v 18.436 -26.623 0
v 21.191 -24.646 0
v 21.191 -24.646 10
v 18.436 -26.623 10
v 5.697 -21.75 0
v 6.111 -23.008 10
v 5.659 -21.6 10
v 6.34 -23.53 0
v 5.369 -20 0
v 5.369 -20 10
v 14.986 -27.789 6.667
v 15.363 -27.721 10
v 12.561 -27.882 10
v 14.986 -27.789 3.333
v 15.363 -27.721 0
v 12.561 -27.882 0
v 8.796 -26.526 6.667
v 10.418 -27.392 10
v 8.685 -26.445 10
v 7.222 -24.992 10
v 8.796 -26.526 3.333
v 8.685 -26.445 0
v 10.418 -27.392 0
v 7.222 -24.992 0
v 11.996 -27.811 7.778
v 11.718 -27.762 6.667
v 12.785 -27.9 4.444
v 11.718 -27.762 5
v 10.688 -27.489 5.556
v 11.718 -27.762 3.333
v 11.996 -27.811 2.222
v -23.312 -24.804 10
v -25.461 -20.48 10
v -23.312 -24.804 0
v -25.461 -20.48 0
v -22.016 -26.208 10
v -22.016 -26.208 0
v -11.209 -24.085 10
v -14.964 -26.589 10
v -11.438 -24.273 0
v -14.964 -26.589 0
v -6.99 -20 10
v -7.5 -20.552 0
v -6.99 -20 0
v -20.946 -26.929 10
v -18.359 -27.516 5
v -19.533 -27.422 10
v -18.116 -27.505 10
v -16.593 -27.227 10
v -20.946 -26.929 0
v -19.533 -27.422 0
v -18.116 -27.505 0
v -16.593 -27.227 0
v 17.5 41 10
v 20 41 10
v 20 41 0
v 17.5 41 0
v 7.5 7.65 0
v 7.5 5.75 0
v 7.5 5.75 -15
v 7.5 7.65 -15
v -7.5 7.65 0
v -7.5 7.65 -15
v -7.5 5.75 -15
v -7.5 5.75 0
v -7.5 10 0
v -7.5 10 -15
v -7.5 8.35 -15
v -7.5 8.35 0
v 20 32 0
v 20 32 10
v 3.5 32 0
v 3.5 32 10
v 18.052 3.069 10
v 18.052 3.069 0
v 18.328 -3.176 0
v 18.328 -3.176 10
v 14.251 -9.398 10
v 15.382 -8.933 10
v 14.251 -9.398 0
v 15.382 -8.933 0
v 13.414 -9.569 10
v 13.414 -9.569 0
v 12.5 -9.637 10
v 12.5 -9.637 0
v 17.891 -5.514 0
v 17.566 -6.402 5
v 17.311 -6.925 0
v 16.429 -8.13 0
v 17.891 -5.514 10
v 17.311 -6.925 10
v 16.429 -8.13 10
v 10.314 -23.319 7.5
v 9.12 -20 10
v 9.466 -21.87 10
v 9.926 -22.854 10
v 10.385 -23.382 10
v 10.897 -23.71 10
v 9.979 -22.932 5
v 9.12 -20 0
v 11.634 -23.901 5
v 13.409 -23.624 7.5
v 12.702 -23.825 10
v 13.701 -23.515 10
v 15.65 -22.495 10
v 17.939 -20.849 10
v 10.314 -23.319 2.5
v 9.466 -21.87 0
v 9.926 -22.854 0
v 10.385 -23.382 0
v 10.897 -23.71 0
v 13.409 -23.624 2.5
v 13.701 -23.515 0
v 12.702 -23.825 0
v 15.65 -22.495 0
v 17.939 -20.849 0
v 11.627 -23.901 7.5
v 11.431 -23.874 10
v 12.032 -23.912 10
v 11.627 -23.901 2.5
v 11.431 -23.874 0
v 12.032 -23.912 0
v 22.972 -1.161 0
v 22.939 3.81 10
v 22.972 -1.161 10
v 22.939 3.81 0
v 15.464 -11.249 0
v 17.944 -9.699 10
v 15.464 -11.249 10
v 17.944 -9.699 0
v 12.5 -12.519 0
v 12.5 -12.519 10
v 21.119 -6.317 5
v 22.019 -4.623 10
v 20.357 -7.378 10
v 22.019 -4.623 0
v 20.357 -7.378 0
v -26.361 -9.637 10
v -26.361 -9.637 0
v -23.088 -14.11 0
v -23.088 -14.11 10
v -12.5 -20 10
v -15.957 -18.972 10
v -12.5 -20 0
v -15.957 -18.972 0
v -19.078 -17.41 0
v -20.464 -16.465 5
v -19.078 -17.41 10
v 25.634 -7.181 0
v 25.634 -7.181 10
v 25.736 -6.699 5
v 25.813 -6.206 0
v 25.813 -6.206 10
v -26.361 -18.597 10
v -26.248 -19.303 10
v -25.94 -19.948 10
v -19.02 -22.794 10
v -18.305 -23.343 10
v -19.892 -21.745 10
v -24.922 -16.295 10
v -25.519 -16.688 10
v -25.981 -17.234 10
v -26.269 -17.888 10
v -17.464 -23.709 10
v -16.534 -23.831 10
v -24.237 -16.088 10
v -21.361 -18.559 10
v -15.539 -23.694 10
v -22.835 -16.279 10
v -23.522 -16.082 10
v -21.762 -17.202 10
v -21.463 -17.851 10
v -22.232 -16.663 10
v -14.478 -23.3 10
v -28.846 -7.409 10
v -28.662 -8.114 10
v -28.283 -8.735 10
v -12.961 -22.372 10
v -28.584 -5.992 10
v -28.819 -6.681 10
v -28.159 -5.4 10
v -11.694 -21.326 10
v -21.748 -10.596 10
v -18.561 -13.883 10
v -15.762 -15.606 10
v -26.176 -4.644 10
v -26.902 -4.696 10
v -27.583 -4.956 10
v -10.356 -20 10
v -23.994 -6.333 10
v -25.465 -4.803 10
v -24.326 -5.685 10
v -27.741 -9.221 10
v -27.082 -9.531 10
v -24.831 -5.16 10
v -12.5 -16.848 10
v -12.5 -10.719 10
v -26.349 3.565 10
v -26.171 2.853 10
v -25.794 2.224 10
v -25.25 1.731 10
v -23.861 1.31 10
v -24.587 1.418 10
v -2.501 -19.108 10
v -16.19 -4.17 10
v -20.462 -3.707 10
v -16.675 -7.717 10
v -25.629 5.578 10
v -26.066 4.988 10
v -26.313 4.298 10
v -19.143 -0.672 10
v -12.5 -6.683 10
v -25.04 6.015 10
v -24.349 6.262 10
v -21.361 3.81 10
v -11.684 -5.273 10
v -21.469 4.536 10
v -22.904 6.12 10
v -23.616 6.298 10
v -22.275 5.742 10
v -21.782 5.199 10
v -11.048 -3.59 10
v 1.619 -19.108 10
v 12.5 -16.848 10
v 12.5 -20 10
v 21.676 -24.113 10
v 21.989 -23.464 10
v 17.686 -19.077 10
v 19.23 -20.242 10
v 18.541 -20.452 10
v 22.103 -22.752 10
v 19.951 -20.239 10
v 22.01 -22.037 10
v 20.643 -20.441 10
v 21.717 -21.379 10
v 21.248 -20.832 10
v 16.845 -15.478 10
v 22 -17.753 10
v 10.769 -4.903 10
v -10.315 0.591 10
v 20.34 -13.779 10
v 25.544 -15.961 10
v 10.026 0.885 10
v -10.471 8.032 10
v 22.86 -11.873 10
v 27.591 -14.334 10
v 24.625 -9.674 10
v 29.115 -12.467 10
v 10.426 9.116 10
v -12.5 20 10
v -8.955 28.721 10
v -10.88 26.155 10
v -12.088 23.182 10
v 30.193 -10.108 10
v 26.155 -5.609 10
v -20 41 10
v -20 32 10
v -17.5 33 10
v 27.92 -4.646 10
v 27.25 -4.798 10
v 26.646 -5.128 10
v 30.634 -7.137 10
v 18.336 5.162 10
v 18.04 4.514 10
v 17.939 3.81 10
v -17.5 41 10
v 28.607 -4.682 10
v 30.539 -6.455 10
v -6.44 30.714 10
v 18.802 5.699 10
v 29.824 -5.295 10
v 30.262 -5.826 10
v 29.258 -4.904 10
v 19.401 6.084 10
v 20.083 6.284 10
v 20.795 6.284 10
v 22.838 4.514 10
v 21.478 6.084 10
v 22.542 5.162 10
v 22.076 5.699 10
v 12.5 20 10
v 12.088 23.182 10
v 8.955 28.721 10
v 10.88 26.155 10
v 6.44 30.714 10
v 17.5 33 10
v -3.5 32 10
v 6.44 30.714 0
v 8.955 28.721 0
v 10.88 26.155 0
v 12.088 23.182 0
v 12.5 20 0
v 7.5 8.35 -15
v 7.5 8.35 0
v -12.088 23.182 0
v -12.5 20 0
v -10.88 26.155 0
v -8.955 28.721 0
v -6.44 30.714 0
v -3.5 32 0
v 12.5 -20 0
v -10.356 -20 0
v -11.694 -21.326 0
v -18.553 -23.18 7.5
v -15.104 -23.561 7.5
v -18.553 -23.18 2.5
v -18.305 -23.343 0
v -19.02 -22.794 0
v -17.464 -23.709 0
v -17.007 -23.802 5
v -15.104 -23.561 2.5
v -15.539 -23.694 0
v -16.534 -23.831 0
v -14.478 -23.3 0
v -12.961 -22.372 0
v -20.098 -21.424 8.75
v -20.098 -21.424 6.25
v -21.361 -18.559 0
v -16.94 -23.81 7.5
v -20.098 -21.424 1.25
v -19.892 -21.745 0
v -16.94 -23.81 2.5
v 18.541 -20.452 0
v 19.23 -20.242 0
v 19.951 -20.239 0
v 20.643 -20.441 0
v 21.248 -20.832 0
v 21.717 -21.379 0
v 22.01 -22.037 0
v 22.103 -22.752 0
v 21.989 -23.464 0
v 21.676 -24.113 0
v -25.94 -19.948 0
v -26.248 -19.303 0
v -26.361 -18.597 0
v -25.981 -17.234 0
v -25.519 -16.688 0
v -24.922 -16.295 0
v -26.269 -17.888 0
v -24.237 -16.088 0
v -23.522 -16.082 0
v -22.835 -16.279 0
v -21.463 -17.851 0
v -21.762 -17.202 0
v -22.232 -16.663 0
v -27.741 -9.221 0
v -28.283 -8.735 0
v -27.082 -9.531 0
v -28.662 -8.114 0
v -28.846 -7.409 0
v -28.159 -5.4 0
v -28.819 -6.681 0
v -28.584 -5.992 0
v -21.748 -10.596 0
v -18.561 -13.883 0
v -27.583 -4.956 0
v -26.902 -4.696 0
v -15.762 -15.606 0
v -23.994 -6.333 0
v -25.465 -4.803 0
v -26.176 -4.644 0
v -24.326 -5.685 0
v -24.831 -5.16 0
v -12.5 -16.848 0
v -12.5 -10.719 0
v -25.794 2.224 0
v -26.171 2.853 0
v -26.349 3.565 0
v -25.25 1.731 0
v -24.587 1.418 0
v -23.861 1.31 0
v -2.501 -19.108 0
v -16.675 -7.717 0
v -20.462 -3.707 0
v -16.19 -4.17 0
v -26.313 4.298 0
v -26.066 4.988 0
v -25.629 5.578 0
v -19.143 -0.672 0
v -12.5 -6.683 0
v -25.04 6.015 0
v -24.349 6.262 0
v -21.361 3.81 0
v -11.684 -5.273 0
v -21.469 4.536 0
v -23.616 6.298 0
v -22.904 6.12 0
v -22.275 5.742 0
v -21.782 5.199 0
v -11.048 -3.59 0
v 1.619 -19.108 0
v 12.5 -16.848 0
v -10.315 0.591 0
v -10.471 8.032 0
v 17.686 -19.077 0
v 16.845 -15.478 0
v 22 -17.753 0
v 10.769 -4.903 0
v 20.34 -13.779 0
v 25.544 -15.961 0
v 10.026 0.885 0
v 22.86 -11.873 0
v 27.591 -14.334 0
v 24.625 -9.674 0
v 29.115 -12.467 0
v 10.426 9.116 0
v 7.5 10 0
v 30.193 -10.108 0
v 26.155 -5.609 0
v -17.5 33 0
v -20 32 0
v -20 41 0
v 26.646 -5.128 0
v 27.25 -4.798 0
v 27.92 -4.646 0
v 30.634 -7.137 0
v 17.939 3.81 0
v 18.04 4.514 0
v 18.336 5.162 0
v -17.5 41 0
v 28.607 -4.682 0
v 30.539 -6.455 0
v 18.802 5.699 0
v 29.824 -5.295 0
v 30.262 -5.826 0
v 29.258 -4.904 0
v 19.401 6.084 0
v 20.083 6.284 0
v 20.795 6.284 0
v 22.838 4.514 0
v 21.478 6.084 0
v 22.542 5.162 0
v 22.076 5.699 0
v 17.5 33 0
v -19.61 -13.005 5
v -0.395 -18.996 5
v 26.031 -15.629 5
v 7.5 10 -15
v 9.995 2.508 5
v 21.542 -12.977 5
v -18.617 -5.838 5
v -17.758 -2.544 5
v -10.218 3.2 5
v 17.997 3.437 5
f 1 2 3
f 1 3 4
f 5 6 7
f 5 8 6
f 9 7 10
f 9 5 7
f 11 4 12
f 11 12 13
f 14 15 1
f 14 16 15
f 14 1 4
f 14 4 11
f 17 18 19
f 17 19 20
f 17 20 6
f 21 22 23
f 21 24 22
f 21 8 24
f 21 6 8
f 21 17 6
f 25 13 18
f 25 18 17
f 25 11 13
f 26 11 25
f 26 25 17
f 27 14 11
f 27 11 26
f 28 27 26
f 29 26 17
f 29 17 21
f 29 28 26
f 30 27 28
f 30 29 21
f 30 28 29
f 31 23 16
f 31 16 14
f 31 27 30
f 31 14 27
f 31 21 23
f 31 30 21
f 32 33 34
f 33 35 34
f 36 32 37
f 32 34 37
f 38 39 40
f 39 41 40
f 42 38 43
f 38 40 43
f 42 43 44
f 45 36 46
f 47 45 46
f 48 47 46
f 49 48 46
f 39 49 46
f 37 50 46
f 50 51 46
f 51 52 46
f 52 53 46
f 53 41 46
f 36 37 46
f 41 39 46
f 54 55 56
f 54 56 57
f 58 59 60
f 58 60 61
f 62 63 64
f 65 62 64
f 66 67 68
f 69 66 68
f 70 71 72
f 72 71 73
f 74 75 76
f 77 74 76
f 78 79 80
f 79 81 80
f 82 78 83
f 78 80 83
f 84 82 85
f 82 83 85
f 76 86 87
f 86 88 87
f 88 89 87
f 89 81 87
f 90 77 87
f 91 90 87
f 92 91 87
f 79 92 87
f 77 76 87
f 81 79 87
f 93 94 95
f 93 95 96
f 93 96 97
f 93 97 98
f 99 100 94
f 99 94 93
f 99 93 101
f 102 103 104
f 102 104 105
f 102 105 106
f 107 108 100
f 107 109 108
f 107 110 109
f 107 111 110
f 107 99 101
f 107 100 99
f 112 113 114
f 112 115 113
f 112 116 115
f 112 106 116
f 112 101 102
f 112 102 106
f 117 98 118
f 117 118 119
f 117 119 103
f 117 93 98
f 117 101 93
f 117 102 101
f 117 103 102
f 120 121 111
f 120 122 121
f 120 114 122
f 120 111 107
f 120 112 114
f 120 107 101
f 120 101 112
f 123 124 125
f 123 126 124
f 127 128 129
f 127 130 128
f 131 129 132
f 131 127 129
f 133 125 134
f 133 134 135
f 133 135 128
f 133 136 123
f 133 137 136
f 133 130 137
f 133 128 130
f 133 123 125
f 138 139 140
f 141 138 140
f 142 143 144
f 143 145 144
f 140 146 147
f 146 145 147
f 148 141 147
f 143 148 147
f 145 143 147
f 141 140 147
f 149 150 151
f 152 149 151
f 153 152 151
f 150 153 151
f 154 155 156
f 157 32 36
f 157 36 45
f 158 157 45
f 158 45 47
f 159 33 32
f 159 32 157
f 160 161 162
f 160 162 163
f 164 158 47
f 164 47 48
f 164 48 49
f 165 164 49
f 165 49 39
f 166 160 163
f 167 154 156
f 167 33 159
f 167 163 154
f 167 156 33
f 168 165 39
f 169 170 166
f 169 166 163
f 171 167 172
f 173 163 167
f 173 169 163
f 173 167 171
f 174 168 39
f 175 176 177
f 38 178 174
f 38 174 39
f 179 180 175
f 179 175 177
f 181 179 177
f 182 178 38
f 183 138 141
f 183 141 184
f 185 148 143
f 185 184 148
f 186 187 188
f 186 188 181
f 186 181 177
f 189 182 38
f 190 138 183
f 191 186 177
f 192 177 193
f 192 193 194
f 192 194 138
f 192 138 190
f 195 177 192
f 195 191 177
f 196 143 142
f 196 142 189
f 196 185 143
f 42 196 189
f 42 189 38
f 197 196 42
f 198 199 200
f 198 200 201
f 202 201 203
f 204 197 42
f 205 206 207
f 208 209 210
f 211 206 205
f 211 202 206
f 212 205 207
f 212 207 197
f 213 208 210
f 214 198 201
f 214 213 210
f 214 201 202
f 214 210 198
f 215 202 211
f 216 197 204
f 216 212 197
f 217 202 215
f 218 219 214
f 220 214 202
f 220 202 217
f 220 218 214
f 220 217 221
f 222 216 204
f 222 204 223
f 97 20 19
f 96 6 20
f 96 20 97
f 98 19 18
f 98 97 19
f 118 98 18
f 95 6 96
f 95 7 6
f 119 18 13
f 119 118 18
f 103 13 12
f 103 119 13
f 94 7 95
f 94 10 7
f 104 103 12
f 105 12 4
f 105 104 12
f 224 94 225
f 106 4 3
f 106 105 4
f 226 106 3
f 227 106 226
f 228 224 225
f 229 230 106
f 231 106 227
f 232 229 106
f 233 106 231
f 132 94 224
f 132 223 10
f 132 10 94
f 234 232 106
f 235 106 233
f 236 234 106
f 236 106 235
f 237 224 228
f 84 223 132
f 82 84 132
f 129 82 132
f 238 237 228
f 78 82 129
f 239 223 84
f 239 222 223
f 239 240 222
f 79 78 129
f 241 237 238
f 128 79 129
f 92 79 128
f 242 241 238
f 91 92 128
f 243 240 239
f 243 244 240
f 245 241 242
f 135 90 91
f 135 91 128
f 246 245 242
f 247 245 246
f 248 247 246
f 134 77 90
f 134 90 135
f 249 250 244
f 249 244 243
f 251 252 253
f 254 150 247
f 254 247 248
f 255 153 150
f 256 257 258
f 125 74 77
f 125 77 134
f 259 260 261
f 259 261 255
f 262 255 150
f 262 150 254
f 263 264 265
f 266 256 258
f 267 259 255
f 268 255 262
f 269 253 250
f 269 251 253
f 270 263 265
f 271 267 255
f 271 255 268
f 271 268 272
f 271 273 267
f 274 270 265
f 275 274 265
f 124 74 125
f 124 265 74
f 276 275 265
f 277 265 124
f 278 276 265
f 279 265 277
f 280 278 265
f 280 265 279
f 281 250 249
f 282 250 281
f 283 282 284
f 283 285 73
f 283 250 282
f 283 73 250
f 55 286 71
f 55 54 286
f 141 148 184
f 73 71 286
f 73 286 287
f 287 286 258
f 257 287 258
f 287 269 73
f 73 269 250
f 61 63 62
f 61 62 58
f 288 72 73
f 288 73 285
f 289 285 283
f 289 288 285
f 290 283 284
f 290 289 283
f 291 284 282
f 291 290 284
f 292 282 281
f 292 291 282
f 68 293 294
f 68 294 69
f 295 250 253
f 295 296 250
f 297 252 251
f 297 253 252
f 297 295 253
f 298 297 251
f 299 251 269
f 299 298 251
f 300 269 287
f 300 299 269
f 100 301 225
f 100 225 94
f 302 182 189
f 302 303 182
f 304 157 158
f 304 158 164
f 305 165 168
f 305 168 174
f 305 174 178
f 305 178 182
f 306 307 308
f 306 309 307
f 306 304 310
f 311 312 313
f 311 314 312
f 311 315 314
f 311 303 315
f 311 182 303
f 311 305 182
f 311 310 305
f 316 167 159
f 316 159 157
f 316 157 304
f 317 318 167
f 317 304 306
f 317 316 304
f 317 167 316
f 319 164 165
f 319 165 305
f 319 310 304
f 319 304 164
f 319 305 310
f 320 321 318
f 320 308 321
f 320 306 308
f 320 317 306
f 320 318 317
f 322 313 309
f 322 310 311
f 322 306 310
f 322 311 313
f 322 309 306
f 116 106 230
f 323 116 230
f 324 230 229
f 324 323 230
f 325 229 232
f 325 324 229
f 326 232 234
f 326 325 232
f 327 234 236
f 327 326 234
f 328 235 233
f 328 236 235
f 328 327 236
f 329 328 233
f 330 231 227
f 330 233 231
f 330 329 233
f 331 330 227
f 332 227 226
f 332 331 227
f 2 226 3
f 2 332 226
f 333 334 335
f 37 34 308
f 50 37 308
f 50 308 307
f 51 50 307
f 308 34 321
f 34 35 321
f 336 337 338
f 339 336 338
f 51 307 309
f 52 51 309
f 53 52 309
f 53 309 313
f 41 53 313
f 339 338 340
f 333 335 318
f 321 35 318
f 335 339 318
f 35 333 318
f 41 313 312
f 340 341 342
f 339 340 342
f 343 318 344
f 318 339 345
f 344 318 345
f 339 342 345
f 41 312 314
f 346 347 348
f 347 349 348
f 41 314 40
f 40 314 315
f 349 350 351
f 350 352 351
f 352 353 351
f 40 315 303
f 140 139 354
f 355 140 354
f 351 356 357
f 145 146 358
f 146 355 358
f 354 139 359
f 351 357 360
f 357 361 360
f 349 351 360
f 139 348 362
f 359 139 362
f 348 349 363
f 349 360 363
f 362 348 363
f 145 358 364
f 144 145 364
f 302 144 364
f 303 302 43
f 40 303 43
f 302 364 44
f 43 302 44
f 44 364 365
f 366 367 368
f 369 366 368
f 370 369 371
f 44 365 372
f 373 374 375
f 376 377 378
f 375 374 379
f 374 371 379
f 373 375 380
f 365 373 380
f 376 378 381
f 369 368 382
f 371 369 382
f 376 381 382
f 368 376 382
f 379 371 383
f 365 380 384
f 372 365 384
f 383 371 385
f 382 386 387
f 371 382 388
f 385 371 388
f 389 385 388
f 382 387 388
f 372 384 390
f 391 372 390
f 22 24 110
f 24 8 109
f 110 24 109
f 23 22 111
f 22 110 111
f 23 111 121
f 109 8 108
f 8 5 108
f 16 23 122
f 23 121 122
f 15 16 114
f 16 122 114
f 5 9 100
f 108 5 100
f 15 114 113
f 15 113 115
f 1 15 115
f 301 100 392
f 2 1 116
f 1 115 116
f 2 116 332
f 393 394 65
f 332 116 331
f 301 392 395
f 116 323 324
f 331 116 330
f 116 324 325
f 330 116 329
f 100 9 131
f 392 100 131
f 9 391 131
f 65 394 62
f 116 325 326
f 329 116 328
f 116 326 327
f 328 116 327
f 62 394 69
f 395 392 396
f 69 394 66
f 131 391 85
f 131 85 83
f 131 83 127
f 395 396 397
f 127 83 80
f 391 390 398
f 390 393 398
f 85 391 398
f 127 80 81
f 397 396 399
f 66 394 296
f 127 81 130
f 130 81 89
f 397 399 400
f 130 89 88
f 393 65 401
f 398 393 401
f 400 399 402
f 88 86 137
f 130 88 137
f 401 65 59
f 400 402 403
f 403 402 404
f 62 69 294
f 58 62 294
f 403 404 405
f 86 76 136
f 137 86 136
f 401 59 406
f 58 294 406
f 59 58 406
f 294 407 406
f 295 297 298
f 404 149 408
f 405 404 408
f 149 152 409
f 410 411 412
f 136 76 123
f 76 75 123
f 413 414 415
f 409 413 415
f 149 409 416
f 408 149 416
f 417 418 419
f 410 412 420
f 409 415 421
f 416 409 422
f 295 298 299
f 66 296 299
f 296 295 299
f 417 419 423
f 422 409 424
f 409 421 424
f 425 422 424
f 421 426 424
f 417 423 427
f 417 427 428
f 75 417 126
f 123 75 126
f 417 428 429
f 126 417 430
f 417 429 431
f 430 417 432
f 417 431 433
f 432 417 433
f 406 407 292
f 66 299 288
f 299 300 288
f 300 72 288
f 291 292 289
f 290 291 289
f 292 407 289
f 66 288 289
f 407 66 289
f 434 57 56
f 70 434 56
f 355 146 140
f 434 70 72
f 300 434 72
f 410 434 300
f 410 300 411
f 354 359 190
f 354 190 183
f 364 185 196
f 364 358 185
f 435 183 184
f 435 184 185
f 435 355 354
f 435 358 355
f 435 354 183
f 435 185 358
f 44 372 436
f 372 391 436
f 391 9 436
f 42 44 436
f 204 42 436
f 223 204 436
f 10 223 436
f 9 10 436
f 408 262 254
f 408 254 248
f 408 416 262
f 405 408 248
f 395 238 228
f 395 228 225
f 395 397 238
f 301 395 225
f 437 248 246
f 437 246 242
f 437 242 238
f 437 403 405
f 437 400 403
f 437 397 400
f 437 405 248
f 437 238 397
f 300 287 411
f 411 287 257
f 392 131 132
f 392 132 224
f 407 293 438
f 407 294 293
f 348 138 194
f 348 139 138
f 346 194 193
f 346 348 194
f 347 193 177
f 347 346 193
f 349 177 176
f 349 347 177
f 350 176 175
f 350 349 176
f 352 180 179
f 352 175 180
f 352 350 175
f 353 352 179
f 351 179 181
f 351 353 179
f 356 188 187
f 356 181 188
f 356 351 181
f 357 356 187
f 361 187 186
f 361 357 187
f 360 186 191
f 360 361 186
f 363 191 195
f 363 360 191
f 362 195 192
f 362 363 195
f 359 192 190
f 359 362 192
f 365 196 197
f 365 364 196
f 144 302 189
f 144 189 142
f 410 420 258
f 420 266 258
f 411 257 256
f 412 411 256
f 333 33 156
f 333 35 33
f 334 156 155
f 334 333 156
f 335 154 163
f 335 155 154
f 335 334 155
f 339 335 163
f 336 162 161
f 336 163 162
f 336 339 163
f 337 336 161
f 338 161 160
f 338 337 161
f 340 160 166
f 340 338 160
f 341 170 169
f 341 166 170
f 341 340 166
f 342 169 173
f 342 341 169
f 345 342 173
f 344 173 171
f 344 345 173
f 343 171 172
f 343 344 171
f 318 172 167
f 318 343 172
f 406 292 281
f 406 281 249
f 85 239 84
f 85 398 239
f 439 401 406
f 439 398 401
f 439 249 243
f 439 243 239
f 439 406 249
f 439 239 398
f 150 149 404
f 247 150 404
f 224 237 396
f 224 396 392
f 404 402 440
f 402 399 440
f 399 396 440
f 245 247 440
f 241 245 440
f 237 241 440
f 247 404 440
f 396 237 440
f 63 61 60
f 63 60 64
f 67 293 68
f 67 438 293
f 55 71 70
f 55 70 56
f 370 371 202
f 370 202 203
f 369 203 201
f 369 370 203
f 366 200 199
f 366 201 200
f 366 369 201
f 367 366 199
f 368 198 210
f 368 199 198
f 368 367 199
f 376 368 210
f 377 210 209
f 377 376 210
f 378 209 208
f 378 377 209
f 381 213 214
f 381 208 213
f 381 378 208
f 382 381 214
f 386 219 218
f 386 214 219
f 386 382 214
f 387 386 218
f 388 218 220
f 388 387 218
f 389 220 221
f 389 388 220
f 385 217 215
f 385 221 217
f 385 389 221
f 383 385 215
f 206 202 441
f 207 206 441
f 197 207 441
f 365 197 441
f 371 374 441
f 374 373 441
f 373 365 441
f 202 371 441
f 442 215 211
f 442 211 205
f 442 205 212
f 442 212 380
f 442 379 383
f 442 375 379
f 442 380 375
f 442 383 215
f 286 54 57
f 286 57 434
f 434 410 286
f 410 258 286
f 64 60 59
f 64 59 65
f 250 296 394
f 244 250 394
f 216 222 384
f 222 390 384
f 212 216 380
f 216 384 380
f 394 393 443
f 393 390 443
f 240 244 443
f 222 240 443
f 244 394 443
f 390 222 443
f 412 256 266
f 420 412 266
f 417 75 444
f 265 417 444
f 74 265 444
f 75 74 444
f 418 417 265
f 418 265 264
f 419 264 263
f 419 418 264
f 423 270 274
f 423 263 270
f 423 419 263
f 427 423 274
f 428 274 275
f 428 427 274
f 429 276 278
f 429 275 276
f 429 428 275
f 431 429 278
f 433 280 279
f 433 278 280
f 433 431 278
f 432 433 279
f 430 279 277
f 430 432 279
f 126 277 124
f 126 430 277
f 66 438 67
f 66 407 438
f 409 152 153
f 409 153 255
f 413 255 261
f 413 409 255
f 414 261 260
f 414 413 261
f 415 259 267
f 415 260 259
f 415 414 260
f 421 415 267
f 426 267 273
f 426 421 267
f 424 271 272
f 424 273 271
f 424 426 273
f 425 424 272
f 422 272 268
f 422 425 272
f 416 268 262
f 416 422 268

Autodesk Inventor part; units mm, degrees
ref_plane "YZ Plane" through (0, 0, 0) normal (1, 0, 0) x (0, 1, 0)
ref_plane "XZ Plane" through (0, 0, 0) normal (0, 1, 0) x (-1, 0, 0)
ref_plane "XY Plane" through (0, 0, 0) normal (0, 0, 1) x (1, 0, 0)
sketch "Sketch2" plane through (0, 0, 0) normal (0, 0, 1) x (1, 0, 0)
  line L0 (-12.5, -16.8475) -> (-12.5, -10.7194)
  line L1 (12.5, -12.5194) -> (12.5, -16.8475)
  line L2 (12.5, -20) -> (-12.5, 20) construction
  line L3 (-12.5, -20) -> (12.5, 20) construction
  arc A0 (12.5, 20) -> (-12.5, 20) centre (0, 20) ccw
  arc A1 (-23.9938, -6.3332) -> (-26.3611, -9.6367) centre (-26.3611, -7.1367) ccw
  arc A2 (-21.3611, 3.8099) -> (-23.8611, 1.3099) centre (-23.8611, 3.8099) ccw
  arc A3 (-21.3611, -18.5591) -> (-25.4614, -20.4798) centre (-23.8611, -18.5591) ccw
  arc A4 (22.9392, 3.8099) -> (18.0516, 3.0686) centre (20.4392, 3.8099) ccw
  arc A5 (30.6335, -7.1367) -> (25.6339, -7.1814) centre (28.1335, -7.1367) ccw
  arc A6 (21.1908, -24.646) -> (17.9392, -20.8491) centre (19.6037, -22.7144) ccw
  spline S0 degree 2 poles (-23.8611, 1.3099) (-19.0526, -6.9708) (-12.5, -10.7194) knots 0 0 0 1 1 1
  spline S1 degree 2 poles (-21.3611, 3.8099) (-18.5864, -3.6522) (-12.5, -6.6832) knots 0 0 0 1 1 1
  spline S2 degree 2 poles (-26.3611, -9.6367) (-21.4971, -18.1116) (-12.5, -20) knots 0 0 0 1 1 1
  spline S3 degree 2 poles (-24.0407, -6.2062) (-21.0395, -14.4004) (-12.5, -16.8475) knots 0 0 0 1 1 1
  spline S4 degree 2 poles (-21.3611, -18.5591) (-18.1547, -28.3248) (-10.356, -20) knots 0 0 0 1 1 1
  spline S5 degree 2 poles (-25.4614, -20.4798) (-20.4927, -34.7918) (-6.9898, -20) knots 0 0 0 1 1 1
  spline S6 degree 2 poles (17.9392, 3.8099) (20.0689, -9.5172) (12.5, -9.6367) knots 0 0 0 1 1 1
  spline S7 degree 2 poles (22.9392, 3.8099) (24.5184, -8.2792) (12.5, -12.5194) knots 0 0 0 1 1 1
  spline S8 degree 2 poles (25.8131, -6.2062) (24.8315, -13.7331) (12.5, -16.8475) knots 0 0 0 1 1 1
  spline S9 degree 2 poles (30.6335, -7.1367) (30.4955, -17.6904) (12.5, -20) knots 0 0 0 1 1 1
  spline S10 degree 2 poles (9.1202, -20) (9.7376, -27.3779) (17.9392, -20.8491) knots 0 0 0 1 1 1
  spline S11 degree 3 poles (21.1908, -24.646) (15.8936, -29.7076) (6.4999, -29.4415) (5.3692, -20) knots 0 0 0 0 1 1 1 1
  spline S12 degree 2 poles (12.5, 20) (7.4894, -0.1647) (12.5, -9.6367) knots 0 0 0 1 1 1
  spline S13 degree 2 poles (-12.5, 20) (-7.9354, -0.2578) (-12.5, -6.6832) knots 0 0 0 1 1 1
  line L4 (12.5, -20) -> (9.1202, -20)
  line L5 (-10.356, -20) -> (-12.5, -20)
  spline S14 degree 2 poles (-6.9898, -20) (0.0212, -17.9924) (5.3692, -20) knots 0 0 0 1 1 1
  point P0 (0, 0)
  point P1 (-18.2659, -6.203)
  point P2 (-17.5697, -2.7642)
  point P3 (-20.3482, -16.5508)
  point P4 (-19.6835, -12.9372)
  point P5 (-17.232, -23.7647)
  point P6 (-19.3511, -27.4539)
  point P7 (17.0045, -7.4262)
  point P8 (21.1905, -6.2037)
  point P9 (22.9403, -11.7957)
  point P10 (27.4494, -14.4708)
  point P11 (11.0482, -23.7717)
  point P12 (14.8952, -27.8035)
  point P13 (9.1239, -26.7454)
  point P14 (10.0714, -0.0017)
  point P15 (-10.3694, -0.0099)
  point P16 (0, -19.0003)
  dimension "d6" = 40
  dimension "d7" = 25
  dimension "d8" = 5
  dimension "d9" = 5
  dimension "d10" = 5
  dimension "d11" = 5
  dimension "d12" = 5
  dimension "d13" = 5
extrude "Extrusion1" add sketch "Sketch2" along normal blind 10 contours L0 S0 A2 S1 S13 A0 S12 S6 A4 S7 L1 S8 A5 S9 L4 S10 A6 S11 S14 S5 A3 S4 L5 S2 A1 S3
sketch "Sketch3" plane through (0, 0, 0) normal (0, 0, -1) x (-1, 0, 0)
  line L0 (7.5, -10) -> (-7.5, -10)
  line L1 (-7.5, -10) -> (-7.5, 10)
  line L2 (-7.5, 10) -> (7.5, 10)
  line L3 (7.5, 10) -> (7.5, -10)
  line L4 (7.5, -10) -> (-7.5, 10) construction
  line L5 (-7.5, -10) -> (7.5, 10) construction
  point P0 (0, 0)
  dimension "d16" = 15
  dimension "d17" = 20
extrude "Belt box" add sketch "Sketch3" along normal blind 15
sketch "Sketch4" plane through (0, 0, -15) normal (0, 0, -1) x (-1, 0, 0)
  line L0 (0, 0) -> (0, 8) construction
  line L1 (0, 0) -> (0, -8) construction
  line L2 (7.5, 7.65) -> (-7.5, 7.65)
  line L3 (-7.5, 7.65) -> (-7.5, 8.35)
  line L4 (-7.5, 8.35) -> (7.5, 8.35)
  line L5 (7.5, 8.35) -> (7.5, 7.65)
  line L6 (7.5, 7.65) -> (-7.5, 8.35) construction
  line L7 (-7.5, 7.65) -> (7.5, 8.35) construction
  line L8 (7.5, -21.75) -> (-7.5, -21.75)
  line L9 (-7.5, -21.75) -> (-7.5, 5.75)
  line L10 (-7.5, 5.75) -> (7.5, 5.75)
  line L11 (7.5, 5.75) -> (7.5, -21.75)
  line L12 (7.5, -21.75) -> (-7.5, 5.75) construction
  line L13 (-7.5, -21.75) -> (7.5, 5.75) construction
  dimension "d20" = 8
  dimension "d21" = 8
  dimension "d22" = 15
  dimension "d23" = 0.7
  dimension "d24" = 15
  dimension "d25" = 27.5
extrude "belt cut out" cut sketch "Sketch4" against normal blind 15
sketch "Sketch5" plane through (0, 0, 10) normal (0, 0, 1) x (1, 0, 0)
  line L0 (-17.5, 33) -> (17.5, 33)
  line L1 (20, 33) -> (20, 32)
  line L2 (20, 32) -> (-20, 32)
  line L3 (-20, 32) -> (-20, 33)
  arc A0 (12.5, 20) -> (-12.5, 20) centre (0, 20) ccw projected
  line L4 (-20, 33) -> (20, 32) construction
  line L5 (20, 33) -> (-20, 32) construction
  line L6 (-20, 33) -> (-20, 58) construction
  line L7 (20, 33) -> (20, 58) construction
  line L8 (-20, 33) -> (-20, 41)
  line L9 (-20, 41) -> (-17.5, 41)
  line L10 (-17.5, 41) -> (-17.5, 33)
  line L11 (20, 33) -> (20, 41)
  line L12 (20, 41) -> (17.5, 41)
  line L13 (17.5, 41) -> (17.5, 33)
  point P0 (0, 0)
  point P1 (0, 32.5)
  point P2 (-3.5, 32)
  point P3 (3.5, 32)
  dimension "d29" = 1
  dimension "d30" = 25
  dimension "d31" = 25
  dimension "d33" = 8
  dimension "d34" = 8
extrude "Extrusion4" add sketch "Sketch5" against normal blind 10 contours L0 L13 L12 L11 L1 L2 A0 L3 L8 L9 L10
properties part number "octopus_on_belt"
